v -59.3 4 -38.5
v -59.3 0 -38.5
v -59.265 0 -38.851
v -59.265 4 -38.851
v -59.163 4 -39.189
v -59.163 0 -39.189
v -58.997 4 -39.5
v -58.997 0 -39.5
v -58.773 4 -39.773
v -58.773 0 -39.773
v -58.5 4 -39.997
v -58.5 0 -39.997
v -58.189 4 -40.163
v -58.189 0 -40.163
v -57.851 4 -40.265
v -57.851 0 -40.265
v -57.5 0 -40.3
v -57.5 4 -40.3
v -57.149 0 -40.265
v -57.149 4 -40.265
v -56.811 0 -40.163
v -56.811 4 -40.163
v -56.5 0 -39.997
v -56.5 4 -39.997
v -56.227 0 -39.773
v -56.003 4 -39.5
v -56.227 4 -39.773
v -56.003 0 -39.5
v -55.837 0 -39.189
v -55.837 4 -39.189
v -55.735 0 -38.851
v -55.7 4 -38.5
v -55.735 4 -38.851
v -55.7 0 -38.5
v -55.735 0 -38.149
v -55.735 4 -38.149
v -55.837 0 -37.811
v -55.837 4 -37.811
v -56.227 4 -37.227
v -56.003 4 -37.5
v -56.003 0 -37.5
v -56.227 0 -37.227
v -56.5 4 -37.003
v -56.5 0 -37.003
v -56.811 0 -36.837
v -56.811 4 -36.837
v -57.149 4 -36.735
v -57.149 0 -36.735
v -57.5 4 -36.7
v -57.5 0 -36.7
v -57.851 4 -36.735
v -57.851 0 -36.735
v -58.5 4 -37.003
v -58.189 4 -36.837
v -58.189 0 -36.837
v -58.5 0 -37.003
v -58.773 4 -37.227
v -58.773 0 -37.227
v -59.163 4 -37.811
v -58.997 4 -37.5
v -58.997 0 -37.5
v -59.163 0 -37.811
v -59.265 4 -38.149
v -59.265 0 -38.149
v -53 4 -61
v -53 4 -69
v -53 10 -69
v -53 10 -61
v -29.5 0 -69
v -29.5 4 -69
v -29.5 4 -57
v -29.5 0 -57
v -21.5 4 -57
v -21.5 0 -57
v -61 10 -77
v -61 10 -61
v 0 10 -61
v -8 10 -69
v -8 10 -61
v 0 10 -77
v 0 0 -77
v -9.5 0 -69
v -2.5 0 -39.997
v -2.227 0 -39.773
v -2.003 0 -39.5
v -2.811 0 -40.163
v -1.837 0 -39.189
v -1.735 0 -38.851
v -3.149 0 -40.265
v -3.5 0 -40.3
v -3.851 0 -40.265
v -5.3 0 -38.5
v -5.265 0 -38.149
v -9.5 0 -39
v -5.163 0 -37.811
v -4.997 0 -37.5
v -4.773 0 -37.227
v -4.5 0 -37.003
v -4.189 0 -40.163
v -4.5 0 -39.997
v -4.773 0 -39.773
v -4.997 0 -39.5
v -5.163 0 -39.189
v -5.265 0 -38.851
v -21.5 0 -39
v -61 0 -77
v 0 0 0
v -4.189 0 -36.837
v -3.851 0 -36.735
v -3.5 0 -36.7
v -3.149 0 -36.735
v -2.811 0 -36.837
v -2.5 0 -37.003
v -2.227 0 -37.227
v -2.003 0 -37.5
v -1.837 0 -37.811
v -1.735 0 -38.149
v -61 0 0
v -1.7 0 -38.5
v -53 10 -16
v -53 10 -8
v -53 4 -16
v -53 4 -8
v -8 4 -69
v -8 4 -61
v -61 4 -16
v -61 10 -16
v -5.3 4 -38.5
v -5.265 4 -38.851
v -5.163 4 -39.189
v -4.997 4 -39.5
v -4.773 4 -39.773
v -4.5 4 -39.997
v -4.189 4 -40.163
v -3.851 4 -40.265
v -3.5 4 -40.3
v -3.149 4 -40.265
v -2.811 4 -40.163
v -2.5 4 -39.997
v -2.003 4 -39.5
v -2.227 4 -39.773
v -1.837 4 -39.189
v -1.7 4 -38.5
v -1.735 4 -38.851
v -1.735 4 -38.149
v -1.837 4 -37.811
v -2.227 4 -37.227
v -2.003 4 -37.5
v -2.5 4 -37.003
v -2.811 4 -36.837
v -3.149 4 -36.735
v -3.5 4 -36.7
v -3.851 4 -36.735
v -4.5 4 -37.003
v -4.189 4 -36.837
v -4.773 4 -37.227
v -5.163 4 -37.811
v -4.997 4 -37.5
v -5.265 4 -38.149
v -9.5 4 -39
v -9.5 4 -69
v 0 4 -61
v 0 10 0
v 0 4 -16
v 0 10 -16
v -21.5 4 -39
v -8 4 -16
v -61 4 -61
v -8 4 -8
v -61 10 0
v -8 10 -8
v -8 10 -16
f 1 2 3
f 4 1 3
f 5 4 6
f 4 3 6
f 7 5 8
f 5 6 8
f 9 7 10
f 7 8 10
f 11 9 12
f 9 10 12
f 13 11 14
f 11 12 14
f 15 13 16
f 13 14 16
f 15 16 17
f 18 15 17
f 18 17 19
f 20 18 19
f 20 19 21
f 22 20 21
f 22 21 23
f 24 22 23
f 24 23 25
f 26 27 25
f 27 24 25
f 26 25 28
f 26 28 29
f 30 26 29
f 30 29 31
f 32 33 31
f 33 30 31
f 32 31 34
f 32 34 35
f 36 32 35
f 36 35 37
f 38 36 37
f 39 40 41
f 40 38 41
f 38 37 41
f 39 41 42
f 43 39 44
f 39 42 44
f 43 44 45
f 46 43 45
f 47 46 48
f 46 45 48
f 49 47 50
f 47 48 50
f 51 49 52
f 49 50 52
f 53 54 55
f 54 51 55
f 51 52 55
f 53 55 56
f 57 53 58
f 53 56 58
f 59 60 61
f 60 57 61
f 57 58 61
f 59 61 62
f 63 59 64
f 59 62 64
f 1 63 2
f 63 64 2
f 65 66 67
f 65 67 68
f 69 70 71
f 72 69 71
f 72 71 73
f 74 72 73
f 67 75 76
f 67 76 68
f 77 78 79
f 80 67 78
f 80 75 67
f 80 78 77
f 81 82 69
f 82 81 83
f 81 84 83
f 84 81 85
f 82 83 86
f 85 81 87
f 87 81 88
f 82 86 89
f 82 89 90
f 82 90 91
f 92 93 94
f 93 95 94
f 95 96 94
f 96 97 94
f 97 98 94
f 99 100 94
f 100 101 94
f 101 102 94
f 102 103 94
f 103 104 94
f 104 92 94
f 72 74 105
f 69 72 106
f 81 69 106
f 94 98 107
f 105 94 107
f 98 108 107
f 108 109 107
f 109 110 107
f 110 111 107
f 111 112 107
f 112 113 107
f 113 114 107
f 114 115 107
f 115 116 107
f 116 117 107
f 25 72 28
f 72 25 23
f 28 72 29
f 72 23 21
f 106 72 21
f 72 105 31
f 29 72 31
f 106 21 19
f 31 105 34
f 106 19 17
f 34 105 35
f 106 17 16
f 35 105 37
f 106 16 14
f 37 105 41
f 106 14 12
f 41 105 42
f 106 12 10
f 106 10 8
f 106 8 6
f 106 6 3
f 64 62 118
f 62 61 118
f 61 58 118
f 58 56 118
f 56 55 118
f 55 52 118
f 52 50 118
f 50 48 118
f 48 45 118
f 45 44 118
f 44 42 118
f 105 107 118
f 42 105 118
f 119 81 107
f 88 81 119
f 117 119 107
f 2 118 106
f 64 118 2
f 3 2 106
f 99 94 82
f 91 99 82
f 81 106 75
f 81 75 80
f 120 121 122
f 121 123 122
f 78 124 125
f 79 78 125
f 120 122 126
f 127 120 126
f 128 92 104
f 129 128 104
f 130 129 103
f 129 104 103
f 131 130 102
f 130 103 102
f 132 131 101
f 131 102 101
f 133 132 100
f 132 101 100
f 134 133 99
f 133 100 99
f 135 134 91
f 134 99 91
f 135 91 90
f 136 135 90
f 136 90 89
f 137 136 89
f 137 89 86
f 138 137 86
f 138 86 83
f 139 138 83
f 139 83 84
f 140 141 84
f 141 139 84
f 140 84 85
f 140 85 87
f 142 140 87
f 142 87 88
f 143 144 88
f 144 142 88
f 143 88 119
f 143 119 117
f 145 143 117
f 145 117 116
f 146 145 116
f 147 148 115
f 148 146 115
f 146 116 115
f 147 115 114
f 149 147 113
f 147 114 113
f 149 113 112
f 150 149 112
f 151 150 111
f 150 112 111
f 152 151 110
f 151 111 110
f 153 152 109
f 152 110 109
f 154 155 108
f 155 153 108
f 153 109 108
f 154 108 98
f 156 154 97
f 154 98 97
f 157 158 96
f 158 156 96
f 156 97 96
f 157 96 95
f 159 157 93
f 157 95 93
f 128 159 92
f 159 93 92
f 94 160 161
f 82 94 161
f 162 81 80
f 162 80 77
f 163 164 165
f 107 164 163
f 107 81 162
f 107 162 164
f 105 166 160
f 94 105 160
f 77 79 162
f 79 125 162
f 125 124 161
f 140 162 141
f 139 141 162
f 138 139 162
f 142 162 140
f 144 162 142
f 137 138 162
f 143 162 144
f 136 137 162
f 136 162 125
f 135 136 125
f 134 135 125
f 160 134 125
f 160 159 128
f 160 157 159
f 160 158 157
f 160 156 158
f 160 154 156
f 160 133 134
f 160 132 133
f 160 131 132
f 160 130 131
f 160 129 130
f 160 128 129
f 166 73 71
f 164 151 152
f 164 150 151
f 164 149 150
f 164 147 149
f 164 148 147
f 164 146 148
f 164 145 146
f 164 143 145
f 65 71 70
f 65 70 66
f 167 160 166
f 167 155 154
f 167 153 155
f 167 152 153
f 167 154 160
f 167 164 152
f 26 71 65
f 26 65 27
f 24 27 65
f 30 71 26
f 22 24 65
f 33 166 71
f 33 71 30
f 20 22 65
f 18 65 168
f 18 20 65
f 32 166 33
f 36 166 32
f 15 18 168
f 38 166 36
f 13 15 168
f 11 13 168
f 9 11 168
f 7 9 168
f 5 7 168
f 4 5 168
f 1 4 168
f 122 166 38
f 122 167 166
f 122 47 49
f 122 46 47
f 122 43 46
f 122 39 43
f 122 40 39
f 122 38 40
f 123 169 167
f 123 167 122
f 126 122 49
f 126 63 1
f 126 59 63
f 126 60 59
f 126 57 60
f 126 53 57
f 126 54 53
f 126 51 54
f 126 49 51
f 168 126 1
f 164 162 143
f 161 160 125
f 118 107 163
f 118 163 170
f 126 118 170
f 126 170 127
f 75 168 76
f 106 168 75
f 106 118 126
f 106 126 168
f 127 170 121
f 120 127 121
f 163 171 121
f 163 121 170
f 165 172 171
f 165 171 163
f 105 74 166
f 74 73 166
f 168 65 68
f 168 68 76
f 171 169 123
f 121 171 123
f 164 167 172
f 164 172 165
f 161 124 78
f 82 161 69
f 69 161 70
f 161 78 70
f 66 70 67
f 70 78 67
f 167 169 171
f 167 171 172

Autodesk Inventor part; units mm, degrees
ref_plane "YZ Plane" through (0, 0, 0) normal (1, 0, 0) x (0, 1, 0)
ref_plane "XZ Plane" through (0, 0, 0) normal (0, 1, 0) x (-1, 0, 0)
ref_plane "XY Plane" through (0, 0, 0) normal (0, 0, 1) x (1, 0, 0)
sketch "Sketch1" plane through (0, 0, 0) normal (0, 1, 0) x (-1, 0, 0)
  line L0 (0, 0) -> (61, 0)
  line L1 (61, 0) -> (61, -77)
  line L2 (61, -77) -> (0, -77)
  line L3 (0, -77) -> (0, 0)
  line L4 (61, -35) -> (54, -35) construction
  line L5 (54, -35) -> (54, -42) construction
  line L6 (54, -42) -> (61, -42) construction
  line L7 (61, -42) -> (61, -35) construction
  line L8 (30.5, 0) -> (30.5, -77) construction
  line L9 (57.5, -35) -> (57.5, -42) construction
  line L10 (61, -38.5) -> (54, -38.5) construction
  circle A0 centre (57.5, -38.5) radius 1.8
  circle A1 centre (3.5, -38.5) radius 1.8
  dimension "d0" = 61
  dimension "d1" = 77
  dimension "d2" = 7
  dimension "d3" = 7
  dimension "d4" = 35
  dimension "d5" = 3.6
extrude "Extrusion1" add sketch "Sketch1" along normal blind 4
sketch "Sketch2" plane through (0, 4, 0) normal (0, 1, 0) x (1, 0, 0)
  line L0 (-61, 77) -> (-61, 0) projected
  line L1 (-61, 0) -> (0, 0)
  line L2 (0, 0) -> (0, 8)
  line L3 (0, 8) -> (-61, 8)
  line L4 (-61, 8) -> (-61, 0)
  line L5 (-61, 0) -> (-53, 0)
  line L6 (-53, 0) -> (-53, 16)
  line L7 (-53, 16) -> (-61, 16)
  line L8 (-61, 16) -> (-61, 0)
  line L9 (-61, 0) -> (0, 0) projected
  line L10 (0, 0) -> (-8, 0)
  line L11 (-8, 0) -> (-8, 16)
  line L12 (-8, 16) -> (0, 16)
  line L13 (0, 16) -> (0, 0)
  line L14 (-61, 38.5) -> (0, 38.5) construction
  line L15 (0, 0) -> (0, 77) projected
  line L16 (-61, 77) -> (0, 77)
  line L17 (0, 77) -> (0, 69)
  line L18 (0, 69) -> (-61, 69)
  line L19 (-61, 69) -> (-61, 77)
  line L20 (-61, 77) -> (-53, 77)
  line L21 (-53, 77) -> (-53, 61)
  line L22 (-53, 61) -> (-61, 61)
  line L23 (-61, 61) -> (-61, 77)
  line L24 (-61, 77) -> (0, 77)
  line L25 (0, 77) -> (-8, 77)
  line L26 (-8, 77) -> (-8, 61)
  line L27 (-8, 61) -> (0, 61)
  line L28 (0, 61) -> (0, 77)
  point P0 (-8, 69)
  point P1 (0, 61)
  point P2 (-53, 69)
  point P3 (-8, 8)
  point P4 (-53, 8)
  dimension "d8" = 8
  dimension "d9" = 8
  dimension "d10" = 16
  dimension "d11" = 8
  dimension "d12" = 16
extrude "Extrusion2" add sketch "Sketch2" along normal blind 6 contours L16 L21 L18 L0 | L18 L21 L22 L0 | L16 L26 L18 L21 | L16 L15 L18 L26 | L7 L6 L3 L0 | L18 L15 L27 L26 | L3 L6 L1 L0 | L3 L11 L1 L6 | L11 L12 L13 L3 | L3 L2 L1 L11
sketch "Sketch3" plane through (0, 4, 0) normal (0, 1, 0) x (1, 0, 0)
  line L0 (-51.5, 8) -> (-9.5, 8) construction
  line L1 (-9.5, 8) -> (-9.5, 69) construction
  line L2 (-9.5, 69) -> (-51.5, 69) construction
  line L3 (-51.5, 69) -> (-51.5, 8) construction
  line L4 (-61, 61) -> (-61, 16) projected
  line L5 (-61, 0) -> (0, 0) projected
  line L6 (-9.5, 69) -> (-21.5, 69)
  line L7 (-21.5, 69) -> (-21.5, 39)
  line L8 (-21.5, 39) -> (-9.5, 39)
  line L9 (-9.5, 39) -> (-9.5, 69)
  line L10 (-9.5, 66) -> (-9.5, 54)
  line L11 (-9.5, 69) -> (-29.5, 69)
  line L12 (-29.5, 69) -> (-29.5, 57)
  line L13 (-29.5, 57) -> (-9.5, 57)
  line L14 (-9.5, 57) -> (-9.5, 69)
  point P0 (-21.5, 57)
  dimension "d15" = 42
  dimension "d16" = 61
  dimension "d17" = 9.5
  dimension "d18" = 8
  dimension "d19" = 12
  dimension "d20" = 30
  dimension "d25" = 20
  dimension "d26" = 12
extrude "Extrusion3" cut sketch "Sketch3" against normal through all
properties part number "ESPLid"
